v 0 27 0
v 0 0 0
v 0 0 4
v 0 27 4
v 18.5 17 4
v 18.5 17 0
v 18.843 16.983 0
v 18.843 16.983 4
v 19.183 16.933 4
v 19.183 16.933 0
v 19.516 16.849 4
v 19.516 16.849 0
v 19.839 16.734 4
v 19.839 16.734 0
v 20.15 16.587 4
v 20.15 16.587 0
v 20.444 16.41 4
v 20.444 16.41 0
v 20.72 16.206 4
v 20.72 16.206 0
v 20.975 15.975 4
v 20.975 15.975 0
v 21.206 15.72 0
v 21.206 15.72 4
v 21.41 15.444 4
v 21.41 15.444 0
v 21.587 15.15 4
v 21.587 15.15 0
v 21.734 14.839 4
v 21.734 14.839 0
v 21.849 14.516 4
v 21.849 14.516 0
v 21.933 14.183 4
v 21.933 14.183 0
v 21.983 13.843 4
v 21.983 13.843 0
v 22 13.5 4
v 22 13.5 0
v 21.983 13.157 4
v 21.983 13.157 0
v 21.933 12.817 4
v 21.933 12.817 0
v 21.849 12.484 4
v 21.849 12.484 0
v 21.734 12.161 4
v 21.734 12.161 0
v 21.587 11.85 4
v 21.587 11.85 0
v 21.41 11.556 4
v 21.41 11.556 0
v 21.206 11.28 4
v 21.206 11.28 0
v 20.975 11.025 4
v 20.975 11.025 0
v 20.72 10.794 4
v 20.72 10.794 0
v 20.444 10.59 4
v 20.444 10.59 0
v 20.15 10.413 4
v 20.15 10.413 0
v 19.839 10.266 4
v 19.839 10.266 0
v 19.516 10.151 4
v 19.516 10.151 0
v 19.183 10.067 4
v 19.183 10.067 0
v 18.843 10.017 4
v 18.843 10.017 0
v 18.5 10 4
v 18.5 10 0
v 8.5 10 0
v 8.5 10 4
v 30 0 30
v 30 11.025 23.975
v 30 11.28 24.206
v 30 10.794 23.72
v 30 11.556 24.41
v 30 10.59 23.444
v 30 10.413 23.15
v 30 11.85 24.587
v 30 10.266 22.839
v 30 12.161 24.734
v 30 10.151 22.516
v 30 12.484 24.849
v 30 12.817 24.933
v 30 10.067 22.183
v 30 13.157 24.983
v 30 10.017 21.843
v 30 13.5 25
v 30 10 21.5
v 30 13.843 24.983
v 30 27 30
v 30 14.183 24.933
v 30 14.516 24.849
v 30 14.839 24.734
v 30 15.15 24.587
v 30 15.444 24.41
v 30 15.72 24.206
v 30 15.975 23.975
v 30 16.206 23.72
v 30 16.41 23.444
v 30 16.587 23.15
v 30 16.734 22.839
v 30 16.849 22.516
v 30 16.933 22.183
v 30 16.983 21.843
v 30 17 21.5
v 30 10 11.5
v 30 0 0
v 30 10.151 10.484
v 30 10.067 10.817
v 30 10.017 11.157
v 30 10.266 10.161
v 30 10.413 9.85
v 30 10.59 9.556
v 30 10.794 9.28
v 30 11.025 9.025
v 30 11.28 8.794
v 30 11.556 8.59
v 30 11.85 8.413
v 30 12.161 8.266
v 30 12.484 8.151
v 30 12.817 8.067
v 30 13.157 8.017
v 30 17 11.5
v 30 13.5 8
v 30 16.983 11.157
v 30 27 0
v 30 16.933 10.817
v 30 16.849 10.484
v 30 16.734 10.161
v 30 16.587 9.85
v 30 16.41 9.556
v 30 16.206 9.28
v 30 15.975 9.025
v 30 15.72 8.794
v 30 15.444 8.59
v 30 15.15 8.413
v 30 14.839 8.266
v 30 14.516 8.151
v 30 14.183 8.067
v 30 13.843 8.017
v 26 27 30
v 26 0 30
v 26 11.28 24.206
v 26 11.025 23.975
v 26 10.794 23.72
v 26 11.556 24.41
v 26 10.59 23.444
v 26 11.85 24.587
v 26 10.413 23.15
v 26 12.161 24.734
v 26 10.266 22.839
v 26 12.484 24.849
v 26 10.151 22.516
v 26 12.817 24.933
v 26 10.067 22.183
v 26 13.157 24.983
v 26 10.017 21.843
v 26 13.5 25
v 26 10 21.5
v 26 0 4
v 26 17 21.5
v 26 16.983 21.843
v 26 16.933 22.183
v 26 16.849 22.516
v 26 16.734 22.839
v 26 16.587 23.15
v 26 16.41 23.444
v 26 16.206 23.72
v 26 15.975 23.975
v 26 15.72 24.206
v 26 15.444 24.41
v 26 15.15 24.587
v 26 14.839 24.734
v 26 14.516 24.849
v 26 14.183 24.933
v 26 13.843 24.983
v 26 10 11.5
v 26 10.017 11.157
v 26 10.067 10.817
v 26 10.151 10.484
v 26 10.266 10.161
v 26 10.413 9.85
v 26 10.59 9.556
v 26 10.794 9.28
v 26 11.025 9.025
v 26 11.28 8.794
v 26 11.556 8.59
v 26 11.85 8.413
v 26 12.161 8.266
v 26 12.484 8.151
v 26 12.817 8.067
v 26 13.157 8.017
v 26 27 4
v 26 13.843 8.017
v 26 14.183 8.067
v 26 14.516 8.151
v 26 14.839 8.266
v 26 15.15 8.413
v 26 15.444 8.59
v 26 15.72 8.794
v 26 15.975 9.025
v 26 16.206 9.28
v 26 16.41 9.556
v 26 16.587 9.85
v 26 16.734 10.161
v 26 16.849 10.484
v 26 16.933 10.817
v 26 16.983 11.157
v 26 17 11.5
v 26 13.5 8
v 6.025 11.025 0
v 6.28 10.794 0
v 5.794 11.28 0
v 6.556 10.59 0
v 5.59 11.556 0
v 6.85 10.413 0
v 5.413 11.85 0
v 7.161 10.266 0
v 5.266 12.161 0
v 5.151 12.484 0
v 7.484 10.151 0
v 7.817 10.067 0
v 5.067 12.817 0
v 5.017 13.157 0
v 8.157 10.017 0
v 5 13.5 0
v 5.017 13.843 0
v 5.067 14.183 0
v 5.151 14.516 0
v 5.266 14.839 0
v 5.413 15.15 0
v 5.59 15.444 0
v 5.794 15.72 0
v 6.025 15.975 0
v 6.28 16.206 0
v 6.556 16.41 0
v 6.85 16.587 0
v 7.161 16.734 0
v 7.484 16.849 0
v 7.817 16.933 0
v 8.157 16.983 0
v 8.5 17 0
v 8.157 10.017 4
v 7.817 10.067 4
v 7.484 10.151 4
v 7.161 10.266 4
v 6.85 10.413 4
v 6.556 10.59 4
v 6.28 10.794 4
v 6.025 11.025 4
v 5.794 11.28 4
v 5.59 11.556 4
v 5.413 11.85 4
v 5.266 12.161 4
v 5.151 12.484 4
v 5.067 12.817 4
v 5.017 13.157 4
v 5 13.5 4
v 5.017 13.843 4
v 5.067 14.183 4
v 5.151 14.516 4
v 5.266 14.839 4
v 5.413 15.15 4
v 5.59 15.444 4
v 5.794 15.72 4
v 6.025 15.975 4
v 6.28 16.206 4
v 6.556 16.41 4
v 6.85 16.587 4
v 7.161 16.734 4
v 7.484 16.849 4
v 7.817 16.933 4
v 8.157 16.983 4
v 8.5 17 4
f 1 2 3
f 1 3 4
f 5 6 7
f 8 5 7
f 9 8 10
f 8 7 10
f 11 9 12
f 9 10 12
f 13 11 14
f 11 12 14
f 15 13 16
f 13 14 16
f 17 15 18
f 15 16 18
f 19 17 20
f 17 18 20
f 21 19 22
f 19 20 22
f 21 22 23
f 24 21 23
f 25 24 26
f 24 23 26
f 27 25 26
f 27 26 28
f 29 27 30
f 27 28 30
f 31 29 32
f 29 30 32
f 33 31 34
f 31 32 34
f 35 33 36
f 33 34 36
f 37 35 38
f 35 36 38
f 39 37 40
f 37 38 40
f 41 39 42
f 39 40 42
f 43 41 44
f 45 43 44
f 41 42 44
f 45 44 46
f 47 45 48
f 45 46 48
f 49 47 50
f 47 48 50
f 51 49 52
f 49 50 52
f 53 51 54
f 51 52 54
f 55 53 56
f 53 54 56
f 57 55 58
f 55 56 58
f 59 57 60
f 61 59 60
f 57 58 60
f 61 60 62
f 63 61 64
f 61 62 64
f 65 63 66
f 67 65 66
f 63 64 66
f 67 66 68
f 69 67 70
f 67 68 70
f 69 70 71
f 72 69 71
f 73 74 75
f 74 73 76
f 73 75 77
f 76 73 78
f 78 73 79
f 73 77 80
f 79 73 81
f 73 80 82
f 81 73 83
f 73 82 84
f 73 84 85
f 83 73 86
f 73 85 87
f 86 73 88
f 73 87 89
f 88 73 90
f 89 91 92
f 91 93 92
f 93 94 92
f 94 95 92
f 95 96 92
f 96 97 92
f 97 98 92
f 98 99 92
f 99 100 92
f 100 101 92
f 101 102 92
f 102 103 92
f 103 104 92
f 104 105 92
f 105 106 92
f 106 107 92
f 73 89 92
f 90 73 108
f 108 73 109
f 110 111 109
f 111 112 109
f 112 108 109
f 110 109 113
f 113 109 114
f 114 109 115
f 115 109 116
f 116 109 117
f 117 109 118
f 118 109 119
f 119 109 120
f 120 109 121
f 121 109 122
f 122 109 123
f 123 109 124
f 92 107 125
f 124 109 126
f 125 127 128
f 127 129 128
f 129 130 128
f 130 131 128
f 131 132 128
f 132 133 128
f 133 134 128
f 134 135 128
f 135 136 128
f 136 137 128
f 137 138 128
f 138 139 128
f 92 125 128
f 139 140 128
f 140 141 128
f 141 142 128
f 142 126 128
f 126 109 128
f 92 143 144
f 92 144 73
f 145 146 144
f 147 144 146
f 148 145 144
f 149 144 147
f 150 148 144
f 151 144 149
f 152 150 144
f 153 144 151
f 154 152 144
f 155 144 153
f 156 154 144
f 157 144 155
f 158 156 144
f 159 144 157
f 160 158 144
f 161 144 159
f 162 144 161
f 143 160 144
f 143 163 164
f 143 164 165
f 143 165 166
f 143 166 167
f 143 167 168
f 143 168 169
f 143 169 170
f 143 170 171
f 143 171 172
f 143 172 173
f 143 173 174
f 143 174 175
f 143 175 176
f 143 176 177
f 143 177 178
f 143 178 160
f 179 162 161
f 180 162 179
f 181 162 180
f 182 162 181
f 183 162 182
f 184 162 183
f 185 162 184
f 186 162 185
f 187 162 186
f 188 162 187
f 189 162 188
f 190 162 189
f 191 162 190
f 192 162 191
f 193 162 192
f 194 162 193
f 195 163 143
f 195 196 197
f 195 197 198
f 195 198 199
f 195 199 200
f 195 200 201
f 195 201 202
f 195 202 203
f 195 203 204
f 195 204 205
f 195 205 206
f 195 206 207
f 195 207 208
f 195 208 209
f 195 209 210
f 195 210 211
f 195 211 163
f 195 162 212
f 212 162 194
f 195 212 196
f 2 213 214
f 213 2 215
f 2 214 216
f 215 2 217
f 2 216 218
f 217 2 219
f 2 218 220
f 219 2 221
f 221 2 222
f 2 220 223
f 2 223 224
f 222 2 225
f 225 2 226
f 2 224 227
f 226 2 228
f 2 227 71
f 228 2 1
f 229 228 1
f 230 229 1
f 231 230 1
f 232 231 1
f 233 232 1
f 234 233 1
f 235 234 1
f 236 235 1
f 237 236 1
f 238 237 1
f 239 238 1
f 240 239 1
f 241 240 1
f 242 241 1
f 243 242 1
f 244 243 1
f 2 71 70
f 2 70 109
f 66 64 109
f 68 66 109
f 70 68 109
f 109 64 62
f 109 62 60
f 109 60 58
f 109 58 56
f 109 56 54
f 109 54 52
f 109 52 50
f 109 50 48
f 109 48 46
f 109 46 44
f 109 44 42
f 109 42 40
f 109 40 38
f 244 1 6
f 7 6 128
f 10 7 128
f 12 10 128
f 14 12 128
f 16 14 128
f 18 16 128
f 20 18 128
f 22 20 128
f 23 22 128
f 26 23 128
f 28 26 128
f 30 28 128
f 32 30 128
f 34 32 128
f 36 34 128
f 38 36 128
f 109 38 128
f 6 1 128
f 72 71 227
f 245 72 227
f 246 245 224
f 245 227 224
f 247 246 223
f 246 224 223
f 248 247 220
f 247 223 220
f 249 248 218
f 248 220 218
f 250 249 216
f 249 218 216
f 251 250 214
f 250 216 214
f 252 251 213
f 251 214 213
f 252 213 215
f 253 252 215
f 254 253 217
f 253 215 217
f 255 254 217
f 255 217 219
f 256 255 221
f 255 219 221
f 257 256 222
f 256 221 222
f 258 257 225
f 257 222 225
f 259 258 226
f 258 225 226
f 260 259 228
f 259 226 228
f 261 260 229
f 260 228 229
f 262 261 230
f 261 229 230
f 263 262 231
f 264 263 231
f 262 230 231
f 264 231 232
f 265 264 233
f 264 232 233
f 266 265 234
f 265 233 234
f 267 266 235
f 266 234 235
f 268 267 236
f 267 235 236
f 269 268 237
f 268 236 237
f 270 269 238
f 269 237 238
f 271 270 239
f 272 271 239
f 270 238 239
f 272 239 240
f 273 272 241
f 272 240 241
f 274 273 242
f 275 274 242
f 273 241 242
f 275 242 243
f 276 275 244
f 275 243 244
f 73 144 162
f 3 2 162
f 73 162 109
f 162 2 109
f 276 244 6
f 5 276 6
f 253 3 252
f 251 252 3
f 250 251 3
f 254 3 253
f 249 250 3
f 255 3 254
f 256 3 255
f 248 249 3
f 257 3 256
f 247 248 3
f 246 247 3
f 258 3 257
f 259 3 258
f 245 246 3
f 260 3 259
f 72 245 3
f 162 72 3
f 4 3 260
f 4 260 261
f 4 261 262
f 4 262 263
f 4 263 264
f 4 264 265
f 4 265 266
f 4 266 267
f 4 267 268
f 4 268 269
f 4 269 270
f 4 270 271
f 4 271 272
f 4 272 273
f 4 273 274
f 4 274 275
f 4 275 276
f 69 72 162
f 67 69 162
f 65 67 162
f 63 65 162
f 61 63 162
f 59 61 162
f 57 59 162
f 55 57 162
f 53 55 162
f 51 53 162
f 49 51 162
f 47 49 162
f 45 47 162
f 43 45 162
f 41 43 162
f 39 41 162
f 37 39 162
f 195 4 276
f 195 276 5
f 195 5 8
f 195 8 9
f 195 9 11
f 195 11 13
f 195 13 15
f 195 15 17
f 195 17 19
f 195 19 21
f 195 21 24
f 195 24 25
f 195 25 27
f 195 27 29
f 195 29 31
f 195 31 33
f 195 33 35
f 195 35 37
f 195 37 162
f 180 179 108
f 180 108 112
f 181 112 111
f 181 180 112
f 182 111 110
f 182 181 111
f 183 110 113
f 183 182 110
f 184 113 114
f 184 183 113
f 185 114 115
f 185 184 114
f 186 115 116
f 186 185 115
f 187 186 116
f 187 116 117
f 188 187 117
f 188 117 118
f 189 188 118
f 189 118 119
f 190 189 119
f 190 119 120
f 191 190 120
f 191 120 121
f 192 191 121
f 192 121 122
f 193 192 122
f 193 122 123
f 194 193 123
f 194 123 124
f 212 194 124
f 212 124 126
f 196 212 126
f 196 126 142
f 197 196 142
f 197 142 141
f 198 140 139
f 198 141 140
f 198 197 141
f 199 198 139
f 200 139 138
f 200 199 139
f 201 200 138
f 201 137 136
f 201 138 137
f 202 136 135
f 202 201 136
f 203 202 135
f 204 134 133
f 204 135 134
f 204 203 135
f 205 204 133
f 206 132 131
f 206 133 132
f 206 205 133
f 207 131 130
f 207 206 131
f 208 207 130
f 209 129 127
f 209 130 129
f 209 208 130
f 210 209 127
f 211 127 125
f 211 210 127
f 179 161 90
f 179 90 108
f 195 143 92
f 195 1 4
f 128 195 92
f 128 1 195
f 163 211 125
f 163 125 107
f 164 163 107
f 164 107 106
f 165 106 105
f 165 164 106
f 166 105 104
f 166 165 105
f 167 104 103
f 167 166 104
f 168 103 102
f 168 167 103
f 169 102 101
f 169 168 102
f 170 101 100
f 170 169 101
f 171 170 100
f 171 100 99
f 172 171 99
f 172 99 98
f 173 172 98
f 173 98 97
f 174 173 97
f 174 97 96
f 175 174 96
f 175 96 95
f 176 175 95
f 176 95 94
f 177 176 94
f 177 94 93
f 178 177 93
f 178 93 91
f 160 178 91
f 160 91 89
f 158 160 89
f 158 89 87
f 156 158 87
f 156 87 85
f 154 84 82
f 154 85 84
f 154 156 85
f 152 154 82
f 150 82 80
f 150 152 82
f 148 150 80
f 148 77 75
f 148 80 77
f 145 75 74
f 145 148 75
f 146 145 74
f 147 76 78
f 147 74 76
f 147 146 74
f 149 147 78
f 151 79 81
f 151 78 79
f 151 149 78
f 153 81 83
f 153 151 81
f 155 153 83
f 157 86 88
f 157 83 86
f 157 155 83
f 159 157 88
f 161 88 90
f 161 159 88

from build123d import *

# Parameters (mm, degrees)
SKETCH_1_W          = 30
SKETCH_1_H          = 27
EXTRUDE_1_DEPTH     = 4
SKETCH_2_W          = 4
SKETCH_2_H          = 27
EXTRUDE_2_DEPTH     = 26
CUT_EXTRUDE_1_DEPTH = 37


with BuildPart() as part:
    # 草图1 → 凸台-拉伸1 (new body)
    with BuildSketch(Plane.XY):
        with Locations((15, 13.5)):
            Rectangle(SKETCH_1_W, SKETCH_1_H)
        with BuildLine():
            Line((8.5, 17), (18.5, 17))
            ThreePointArc((18.5, 17), (22, 13.5), (18.5, 10))
            Line((18.5, 10), (8.5, 10))
            ThreePointArc((8.5, 10), (5, 13.5), (8.5, 17))
        make_face(mode=Mode.SUBTRACT)
    extrude(amount=EXTRUDE_1_DEPTH)

    # 草图2 → 凸台-拉伸2 (add)
    with BuildSketch(Plane.XY.offset(4)):
        with Locations((28, 13.5)):
            Rectangle(SKETCH_2_W, SKETCH_2_H)
    extrude(amount=EXTRUDE_2_DEPTH)

    # 草图3 → 切除-拉伸1 (cut)
    with BuildSketch(Plane.ZY.offset(-26)):
        with BuildLine():
            Line((21.5, 10), (11.5, 10))
            ThreePointArc((11.5, 10), (8, 13.5), (11.5, 17))
            Line((11.5, 17), (21.5, 17))
            ThreePointArc((21.5, 17), (25, 13.5), (21.5, 10))
        make_face()
    extrude(amount=-CUT_EXTRUDE_1_DEPTH, mode=Mode.SUBTRACT)


solid = part.part
